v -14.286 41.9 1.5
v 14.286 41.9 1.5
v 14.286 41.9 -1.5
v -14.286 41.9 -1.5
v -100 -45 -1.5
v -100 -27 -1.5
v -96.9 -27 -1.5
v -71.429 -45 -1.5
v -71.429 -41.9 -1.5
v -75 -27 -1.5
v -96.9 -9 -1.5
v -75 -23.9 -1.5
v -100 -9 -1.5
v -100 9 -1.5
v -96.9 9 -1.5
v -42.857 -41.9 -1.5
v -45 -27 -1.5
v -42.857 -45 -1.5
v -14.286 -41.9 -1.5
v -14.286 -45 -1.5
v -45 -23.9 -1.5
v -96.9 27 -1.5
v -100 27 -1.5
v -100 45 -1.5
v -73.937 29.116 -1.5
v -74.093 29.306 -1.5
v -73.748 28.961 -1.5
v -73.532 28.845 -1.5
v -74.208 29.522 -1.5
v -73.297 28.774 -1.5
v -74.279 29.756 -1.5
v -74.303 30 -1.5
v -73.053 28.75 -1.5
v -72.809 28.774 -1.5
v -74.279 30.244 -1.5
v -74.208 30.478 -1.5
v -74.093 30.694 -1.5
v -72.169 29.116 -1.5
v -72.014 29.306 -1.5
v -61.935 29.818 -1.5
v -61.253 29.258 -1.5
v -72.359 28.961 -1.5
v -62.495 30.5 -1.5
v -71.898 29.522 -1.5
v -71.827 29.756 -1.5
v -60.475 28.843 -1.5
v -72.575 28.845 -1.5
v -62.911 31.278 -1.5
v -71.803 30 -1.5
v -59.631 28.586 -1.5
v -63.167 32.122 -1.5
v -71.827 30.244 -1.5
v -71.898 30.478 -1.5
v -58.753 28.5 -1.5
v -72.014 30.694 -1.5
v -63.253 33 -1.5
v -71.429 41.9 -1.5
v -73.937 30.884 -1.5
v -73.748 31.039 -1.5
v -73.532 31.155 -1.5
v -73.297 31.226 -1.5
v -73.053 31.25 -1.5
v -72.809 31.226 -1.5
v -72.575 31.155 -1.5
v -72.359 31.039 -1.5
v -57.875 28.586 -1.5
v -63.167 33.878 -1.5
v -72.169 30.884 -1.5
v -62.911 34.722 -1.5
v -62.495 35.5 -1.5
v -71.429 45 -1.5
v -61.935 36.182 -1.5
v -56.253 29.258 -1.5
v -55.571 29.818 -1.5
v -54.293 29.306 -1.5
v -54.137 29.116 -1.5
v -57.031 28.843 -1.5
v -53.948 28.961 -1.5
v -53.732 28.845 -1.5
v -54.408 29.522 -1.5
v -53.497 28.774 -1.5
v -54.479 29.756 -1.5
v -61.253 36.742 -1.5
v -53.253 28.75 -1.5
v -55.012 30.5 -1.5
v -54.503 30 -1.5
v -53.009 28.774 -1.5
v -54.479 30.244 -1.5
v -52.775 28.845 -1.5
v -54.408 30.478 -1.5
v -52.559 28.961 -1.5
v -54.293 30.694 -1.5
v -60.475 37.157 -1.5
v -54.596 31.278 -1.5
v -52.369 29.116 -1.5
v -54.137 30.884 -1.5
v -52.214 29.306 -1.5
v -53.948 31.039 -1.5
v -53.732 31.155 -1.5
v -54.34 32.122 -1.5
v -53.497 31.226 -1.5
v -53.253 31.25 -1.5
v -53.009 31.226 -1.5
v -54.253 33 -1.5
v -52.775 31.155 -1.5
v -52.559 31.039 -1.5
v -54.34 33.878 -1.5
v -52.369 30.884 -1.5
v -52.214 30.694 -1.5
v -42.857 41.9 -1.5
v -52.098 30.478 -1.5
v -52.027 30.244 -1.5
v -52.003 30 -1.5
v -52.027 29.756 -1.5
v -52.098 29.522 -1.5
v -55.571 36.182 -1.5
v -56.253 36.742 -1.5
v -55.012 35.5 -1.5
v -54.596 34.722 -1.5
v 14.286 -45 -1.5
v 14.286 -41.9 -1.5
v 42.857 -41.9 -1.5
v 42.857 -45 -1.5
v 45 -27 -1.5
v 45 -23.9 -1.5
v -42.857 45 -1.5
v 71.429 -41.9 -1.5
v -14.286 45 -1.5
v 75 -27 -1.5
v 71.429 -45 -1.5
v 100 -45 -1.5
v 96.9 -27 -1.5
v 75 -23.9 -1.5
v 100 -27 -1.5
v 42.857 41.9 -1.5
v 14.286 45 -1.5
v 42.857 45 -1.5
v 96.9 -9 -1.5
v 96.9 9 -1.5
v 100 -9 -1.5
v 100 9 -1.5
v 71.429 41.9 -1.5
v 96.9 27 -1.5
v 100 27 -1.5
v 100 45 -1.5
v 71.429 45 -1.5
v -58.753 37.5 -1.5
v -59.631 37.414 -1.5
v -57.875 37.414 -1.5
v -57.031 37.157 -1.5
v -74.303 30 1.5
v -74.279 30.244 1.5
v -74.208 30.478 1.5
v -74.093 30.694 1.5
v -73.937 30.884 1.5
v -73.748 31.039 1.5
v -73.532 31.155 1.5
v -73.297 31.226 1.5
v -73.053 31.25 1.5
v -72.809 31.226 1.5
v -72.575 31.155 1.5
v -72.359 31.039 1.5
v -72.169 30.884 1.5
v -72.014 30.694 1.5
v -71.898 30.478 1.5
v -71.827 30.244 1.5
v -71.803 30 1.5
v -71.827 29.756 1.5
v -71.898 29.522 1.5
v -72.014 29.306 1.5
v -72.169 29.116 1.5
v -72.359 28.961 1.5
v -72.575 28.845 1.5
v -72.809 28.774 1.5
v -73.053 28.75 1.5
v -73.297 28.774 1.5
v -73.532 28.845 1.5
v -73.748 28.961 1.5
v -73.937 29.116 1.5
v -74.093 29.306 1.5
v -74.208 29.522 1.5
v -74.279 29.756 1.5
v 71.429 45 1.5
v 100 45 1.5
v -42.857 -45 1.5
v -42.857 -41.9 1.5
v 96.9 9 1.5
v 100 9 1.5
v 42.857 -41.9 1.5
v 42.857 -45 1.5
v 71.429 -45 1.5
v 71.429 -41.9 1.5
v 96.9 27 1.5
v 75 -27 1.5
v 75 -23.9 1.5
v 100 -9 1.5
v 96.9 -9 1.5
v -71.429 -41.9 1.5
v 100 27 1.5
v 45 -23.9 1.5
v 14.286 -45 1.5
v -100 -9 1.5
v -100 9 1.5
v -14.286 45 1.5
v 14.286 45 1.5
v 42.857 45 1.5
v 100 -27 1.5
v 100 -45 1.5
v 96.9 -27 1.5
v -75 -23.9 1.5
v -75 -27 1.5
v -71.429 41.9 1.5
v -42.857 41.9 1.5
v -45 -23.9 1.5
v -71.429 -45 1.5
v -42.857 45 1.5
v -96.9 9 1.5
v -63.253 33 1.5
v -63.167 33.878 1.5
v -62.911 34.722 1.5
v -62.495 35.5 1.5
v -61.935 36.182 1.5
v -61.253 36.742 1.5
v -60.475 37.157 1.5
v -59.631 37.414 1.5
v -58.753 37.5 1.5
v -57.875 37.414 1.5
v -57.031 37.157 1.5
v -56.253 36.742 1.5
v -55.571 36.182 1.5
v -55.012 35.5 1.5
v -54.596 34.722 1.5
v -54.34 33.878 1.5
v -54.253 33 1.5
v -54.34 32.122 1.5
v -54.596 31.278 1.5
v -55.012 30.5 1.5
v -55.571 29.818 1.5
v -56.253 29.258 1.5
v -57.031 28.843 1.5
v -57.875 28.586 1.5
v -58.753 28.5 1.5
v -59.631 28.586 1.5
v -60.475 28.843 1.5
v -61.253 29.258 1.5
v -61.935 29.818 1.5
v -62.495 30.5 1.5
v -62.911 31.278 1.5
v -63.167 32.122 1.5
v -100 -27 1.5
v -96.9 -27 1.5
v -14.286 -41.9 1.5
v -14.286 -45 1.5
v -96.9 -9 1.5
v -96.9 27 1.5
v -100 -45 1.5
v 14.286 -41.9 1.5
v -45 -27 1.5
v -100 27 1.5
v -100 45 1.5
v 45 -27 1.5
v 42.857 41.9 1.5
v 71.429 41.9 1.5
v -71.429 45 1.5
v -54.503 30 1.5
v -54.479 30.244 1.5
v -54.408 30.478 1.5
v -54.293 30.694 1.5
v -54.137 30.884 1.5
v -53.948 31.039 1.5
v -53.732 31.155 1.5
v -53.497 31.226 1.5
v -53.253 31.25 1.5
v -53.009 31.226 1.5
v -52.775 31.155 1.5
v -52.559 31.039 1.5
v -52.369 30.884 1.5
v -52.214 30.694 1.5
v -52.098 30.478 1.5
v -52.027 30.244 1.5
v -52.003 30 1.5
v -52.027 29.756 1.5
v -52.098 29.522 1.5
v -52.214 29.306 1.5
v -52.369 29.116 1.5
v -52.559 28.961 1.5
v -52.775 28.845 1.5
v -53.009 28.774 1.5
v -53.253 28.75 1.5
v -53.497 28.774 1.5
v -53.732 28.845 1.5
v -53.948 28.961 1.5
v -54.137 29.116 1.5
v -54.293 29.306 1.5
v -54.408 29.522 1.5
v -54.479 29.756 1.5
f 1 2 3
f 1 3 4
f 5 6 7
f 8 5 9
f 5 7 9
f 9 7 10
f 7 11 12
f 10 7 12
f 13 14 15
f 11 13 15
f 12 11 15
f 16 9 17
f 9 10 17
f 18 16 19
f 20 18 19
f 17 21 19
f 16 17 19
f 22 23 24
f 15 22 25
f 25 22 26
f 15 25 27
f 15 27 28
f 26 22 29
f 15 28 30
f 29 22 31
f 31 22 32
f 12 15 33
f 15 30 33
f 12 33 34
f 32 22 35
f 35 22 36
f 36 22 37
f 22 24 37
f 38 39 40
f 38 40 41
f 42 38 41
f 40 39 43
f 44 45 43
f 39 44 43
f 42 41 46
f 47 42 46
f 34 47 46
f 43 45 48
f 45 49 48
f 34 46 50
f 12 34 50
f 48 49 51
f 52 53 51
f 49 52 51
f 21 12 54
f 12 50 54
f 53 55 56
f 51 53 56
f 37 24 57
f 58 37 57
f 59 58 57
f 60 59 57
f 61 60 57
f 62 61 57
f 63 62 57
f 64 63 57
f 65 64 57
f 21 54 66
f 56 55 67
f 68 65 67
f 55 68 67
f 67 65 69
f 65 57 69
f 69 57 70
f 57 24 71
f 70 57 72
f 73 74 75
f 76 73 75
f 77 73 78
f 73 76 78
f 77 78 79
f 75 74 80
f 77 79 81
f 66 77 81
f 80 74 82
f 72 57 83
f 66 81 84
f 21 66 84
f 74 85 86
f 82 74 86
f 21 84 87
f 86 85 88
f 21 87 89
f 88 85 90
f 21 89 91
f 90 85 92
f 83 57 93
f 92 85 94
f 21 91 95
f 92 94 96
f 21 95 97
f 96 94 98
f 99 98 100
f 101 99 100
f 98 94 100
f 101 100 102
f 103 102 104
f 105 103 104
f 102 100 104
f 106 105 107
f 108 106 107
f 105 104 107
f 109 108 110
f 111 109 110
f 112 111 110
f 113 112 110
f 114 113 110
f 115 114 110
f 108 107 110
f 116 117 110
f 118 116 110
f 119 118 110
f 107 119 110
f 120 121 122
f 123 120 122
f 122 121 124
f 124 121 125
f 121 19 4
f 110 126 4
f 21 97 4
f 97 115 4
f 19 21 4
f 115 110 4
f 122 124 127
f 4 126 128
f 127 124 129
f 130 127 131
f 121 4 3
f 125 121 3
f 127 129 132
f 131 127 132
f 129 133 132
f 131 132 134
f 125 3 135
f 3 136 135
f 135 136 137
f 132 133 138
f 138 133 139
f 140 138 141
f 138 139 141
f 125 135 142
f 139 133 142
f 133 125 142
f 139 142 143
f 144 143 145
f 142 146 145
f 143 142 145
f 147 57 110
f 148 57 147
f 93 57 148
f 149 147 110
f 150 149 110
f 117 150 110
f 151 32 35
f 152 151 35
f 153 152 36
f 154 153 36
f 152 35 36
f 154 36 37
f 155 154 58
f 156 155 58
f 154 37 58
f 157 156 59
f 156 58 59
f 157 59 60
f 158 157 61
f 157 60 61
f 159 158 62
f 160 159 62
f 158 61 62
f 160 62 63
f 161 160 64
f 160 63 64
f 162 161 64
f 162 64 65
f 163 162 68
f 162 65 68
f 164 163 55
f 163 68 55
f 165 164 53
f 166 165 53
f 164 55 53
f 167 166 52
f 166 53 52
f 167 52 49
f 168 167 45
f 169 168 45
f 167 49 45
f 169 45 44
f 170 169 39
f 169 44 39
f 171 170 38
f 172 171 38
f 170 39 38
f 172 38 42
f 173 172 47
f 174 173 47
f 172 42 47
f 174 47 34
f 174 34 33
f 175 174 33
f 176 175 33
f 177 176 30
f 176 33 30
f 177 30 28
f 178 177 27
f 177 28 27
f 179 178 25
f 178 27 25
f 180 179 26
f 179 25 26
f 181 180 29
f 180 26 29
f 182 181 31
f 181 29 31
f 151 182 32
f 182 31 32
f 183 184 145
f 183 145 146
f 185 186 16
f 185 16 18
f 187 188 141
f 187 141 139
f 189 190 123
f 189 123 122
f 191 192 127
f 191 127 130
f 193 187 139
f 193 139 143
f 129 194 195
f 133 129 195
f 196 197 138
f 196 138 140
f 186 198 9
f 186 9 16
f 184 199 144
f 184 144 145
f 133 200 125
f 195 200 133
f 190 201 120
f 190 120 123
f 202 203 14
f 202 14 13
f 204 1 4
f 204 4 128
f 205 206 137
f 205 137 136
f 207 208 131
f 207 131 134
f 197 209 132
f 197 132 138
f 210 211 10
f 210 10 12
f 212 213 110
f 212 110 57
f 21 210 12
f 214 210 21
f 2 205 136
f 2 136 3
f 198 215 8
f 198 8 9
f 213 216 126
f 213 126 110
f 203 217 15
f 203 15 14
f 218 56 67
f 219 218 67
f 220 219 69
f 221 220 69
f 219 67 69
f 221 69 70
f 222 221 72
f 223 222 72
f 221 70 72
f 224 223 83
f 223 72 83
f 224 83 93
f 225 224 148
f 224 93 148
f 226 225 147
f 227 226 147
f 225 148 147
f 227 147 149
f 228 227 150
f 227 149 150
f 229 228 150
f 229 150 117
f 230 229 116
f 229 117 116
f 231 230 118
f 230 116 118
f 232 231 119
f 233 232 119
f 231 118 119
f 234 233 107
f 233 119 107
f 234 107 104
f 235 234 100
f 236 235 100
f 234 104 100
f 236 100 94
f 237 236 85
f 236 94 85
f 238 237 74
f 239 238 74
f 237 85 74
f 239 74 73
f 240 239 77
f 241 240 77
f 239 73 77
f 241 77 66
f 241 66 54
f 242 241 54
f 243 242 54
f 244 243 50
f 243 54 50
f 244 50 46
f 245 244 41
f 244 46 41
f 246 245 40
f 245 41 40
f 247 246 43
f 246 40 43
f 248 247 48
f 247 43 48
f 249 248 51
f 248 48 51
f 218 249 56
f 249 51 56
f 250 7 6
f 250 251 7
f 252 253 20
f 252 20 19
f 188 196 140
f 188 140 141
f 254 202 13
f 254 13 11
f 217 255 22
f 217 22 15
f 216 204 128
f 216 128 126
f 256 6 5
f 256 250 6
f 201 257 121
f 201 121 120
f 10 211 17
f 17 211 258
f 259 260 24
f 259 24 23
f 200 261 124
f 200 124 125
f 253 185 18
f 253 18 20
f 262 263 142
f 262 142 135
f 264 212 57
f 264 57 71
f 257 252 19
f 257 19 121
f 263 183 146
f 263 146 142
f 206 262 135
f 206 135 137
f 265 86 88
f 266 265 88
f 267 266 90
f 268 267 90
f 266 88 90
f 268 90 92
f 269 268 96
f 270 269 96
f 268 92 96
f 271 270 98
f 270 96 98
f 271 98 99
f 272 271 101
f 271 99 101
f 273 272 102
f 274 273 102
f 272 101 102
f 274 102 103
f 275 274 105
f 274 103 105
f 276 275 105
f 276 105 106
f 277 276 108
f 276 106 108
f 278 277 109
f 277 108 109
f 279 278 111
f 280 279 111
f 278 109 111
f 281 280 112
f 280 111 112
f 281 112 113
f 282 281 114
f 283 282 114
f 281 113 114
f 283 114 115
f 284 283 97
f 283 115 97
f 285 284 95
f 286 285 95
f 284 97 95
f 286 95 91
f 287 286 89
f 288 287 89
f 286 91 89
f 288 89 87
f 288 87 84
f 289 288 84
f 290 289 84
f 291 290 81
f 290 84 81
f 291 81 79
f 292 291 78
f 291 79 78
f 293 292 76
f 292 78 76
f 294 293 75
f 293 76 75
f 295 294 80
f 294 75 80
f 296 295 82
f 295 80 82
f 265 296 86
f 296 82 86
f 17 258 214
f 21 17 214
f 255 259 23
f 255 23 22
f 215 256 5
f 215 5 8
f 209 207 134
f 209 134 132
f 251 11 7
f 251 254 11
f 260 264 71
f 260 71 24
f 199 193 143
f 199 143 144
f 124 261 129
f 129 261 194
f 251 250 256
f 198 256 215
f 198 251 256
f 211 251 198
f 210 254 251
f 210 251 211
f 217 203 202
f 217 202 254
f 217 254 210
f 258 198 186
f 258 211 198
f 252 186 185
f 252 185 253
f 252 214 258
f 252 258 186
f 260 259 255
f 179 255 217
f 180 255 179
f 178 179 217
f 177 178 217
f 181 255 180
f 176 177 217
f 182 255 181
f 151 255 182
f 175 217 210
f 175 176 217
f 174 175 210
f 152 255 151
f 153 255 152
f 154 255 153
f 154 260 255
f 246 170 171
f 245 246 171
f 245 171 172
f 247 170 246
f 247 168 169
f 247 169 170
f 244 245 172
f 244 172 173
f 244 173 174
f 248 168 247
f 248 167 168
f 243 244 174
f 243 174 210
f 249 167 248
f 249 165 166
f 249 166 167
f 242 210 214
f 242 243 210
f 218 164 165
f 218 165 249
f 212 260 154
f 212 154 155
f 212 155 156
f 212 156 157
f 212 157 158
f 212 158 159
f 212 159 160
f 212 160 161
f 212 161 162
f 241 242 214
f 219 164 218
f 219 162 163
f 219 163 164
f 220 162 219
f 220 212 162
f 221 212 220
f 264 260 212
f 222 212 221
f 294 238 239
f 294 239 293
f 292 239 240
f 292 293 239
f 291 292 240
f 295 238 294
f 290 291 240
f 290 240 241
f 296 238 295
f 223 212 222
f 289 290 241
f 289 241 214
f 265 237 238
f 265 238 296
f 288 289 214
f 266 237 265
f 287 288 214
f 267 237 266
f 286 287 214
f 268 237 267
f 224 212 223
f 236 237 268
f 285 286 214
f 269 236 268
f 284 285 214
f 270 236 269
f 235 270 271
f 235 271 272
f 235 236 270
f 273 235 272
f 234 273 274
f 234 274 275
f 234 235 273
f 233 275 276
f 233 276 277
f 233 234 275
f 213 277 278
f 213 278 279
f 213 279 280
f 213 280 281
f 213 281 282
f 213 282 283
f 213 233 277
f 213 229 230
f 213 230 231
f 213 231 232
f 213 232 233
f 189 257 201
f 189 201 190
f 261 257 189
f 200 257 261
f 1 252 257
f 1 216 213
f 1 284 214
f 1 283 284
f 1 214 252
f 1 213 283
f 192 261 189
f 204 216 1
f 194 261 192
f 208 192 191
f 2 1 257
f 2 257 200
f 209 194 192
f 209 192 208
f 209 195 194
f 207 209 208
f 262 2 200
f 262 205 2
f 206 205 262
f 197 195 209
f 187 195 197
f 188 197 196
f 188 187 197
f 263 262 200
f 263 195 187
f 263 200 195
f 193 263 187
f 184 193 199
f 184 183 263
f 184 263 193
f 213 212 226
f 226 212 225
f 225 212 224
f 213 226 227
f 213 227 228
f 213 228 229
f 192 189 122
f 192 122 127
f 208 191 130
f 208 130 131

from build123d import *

# Parameters (mm, degrees)
SALIENTE_EXTRUIR1_DEPTH = 1.5
CROQUIS2_W              = 30
CROQUIS2_H              = 3.1
CORTAR_EXTRUIR1_DEPTH   = 10
CROQUIS6_R              = 1.25
CROQUIS6_R_2            = 4.5
CORTAR_EXTRUIR2_DEPTH   = 3


with BuildPart() as part:
    # Croquis1 → Saliente-Extruir1 (new, symmetric)
    with BuildSketch(Plane.XY):
        Polygon((-100, -27), (-100, -45), (-71.428571429, -45), (-71.428571429, -41.9), (-42.857142857, -41.9), (-42.857142857, -45), (-14.285714286, -45), (-14.285714286, -41.9), (14.285714286, -41.9), (14.285714286, -45), (42.857142857, -45), (42.857142857, -41.9), (71.428571429, -41.9), (71.428571429, -45), (100, -45), (100, -27), (96.9, -27), (96.9, -9), (100, -9), (100, 9), (96.9, 9), (96.9, 27), (100, 27), (100, 45), (71.428571429, 45), (71.428571429, 41.9), (42.857142857, 41.9), (42.857142857, 45), (14.285714286, 45), (14.285714286, 41.9), (-14.285714286, 41.9), (-14.285714286, 45), (-42.857142857, 45), (-42.857142857, 41.9), (-71.428571429, 41.9), (-71.428571429, 45), (-100, 45), (-100, 27), (-96.9, 27), (-96.9, 9), (-100, 9), (-100, -9), (-96.9, -9), (-96.9, -27), align=None)
    extrude(amount=SALIENTE_EXTRUIR1_DEPTH, both=True)

    # Croquis2 → Cortar-Extruir1 (cut)
    with BuildSketch(Plane.XY.offset(1.5)):
        with Locations((-60, -25.45)):
            Rectangle(CROQUIS2_W, CROQUIS2_H)
        with Locations((60, -25.45)):
            Rectangle(CROQUIS2_W, CROQUIS2_H)
    extrude(amount=-CORTAR_EXTRUIR1_DEPTH, mode=Mode.SUBTRACT)

    # Croquis6 → Cortar-Extruir2 (cut)
    with BuildSketch(Plane(origin=(0, 0, -1.5), x_dir=(-1, 0, 0), z_dir=(0, 0, -1))):
        with Locations((53.253279384, 30)):
            Circle(CROQUIS6_R)
        with Locations((73.053279384, 30)):
            Circle(CROQUIS6_R)
        with Locations((58.753279384, 33)):
            Circle(CROQUIS6_R_2)
    extrude(amount=-CORTAR_EXTRUIR2_DEPTH, mode=Mode.SUBTRACT)


solid = part.part
